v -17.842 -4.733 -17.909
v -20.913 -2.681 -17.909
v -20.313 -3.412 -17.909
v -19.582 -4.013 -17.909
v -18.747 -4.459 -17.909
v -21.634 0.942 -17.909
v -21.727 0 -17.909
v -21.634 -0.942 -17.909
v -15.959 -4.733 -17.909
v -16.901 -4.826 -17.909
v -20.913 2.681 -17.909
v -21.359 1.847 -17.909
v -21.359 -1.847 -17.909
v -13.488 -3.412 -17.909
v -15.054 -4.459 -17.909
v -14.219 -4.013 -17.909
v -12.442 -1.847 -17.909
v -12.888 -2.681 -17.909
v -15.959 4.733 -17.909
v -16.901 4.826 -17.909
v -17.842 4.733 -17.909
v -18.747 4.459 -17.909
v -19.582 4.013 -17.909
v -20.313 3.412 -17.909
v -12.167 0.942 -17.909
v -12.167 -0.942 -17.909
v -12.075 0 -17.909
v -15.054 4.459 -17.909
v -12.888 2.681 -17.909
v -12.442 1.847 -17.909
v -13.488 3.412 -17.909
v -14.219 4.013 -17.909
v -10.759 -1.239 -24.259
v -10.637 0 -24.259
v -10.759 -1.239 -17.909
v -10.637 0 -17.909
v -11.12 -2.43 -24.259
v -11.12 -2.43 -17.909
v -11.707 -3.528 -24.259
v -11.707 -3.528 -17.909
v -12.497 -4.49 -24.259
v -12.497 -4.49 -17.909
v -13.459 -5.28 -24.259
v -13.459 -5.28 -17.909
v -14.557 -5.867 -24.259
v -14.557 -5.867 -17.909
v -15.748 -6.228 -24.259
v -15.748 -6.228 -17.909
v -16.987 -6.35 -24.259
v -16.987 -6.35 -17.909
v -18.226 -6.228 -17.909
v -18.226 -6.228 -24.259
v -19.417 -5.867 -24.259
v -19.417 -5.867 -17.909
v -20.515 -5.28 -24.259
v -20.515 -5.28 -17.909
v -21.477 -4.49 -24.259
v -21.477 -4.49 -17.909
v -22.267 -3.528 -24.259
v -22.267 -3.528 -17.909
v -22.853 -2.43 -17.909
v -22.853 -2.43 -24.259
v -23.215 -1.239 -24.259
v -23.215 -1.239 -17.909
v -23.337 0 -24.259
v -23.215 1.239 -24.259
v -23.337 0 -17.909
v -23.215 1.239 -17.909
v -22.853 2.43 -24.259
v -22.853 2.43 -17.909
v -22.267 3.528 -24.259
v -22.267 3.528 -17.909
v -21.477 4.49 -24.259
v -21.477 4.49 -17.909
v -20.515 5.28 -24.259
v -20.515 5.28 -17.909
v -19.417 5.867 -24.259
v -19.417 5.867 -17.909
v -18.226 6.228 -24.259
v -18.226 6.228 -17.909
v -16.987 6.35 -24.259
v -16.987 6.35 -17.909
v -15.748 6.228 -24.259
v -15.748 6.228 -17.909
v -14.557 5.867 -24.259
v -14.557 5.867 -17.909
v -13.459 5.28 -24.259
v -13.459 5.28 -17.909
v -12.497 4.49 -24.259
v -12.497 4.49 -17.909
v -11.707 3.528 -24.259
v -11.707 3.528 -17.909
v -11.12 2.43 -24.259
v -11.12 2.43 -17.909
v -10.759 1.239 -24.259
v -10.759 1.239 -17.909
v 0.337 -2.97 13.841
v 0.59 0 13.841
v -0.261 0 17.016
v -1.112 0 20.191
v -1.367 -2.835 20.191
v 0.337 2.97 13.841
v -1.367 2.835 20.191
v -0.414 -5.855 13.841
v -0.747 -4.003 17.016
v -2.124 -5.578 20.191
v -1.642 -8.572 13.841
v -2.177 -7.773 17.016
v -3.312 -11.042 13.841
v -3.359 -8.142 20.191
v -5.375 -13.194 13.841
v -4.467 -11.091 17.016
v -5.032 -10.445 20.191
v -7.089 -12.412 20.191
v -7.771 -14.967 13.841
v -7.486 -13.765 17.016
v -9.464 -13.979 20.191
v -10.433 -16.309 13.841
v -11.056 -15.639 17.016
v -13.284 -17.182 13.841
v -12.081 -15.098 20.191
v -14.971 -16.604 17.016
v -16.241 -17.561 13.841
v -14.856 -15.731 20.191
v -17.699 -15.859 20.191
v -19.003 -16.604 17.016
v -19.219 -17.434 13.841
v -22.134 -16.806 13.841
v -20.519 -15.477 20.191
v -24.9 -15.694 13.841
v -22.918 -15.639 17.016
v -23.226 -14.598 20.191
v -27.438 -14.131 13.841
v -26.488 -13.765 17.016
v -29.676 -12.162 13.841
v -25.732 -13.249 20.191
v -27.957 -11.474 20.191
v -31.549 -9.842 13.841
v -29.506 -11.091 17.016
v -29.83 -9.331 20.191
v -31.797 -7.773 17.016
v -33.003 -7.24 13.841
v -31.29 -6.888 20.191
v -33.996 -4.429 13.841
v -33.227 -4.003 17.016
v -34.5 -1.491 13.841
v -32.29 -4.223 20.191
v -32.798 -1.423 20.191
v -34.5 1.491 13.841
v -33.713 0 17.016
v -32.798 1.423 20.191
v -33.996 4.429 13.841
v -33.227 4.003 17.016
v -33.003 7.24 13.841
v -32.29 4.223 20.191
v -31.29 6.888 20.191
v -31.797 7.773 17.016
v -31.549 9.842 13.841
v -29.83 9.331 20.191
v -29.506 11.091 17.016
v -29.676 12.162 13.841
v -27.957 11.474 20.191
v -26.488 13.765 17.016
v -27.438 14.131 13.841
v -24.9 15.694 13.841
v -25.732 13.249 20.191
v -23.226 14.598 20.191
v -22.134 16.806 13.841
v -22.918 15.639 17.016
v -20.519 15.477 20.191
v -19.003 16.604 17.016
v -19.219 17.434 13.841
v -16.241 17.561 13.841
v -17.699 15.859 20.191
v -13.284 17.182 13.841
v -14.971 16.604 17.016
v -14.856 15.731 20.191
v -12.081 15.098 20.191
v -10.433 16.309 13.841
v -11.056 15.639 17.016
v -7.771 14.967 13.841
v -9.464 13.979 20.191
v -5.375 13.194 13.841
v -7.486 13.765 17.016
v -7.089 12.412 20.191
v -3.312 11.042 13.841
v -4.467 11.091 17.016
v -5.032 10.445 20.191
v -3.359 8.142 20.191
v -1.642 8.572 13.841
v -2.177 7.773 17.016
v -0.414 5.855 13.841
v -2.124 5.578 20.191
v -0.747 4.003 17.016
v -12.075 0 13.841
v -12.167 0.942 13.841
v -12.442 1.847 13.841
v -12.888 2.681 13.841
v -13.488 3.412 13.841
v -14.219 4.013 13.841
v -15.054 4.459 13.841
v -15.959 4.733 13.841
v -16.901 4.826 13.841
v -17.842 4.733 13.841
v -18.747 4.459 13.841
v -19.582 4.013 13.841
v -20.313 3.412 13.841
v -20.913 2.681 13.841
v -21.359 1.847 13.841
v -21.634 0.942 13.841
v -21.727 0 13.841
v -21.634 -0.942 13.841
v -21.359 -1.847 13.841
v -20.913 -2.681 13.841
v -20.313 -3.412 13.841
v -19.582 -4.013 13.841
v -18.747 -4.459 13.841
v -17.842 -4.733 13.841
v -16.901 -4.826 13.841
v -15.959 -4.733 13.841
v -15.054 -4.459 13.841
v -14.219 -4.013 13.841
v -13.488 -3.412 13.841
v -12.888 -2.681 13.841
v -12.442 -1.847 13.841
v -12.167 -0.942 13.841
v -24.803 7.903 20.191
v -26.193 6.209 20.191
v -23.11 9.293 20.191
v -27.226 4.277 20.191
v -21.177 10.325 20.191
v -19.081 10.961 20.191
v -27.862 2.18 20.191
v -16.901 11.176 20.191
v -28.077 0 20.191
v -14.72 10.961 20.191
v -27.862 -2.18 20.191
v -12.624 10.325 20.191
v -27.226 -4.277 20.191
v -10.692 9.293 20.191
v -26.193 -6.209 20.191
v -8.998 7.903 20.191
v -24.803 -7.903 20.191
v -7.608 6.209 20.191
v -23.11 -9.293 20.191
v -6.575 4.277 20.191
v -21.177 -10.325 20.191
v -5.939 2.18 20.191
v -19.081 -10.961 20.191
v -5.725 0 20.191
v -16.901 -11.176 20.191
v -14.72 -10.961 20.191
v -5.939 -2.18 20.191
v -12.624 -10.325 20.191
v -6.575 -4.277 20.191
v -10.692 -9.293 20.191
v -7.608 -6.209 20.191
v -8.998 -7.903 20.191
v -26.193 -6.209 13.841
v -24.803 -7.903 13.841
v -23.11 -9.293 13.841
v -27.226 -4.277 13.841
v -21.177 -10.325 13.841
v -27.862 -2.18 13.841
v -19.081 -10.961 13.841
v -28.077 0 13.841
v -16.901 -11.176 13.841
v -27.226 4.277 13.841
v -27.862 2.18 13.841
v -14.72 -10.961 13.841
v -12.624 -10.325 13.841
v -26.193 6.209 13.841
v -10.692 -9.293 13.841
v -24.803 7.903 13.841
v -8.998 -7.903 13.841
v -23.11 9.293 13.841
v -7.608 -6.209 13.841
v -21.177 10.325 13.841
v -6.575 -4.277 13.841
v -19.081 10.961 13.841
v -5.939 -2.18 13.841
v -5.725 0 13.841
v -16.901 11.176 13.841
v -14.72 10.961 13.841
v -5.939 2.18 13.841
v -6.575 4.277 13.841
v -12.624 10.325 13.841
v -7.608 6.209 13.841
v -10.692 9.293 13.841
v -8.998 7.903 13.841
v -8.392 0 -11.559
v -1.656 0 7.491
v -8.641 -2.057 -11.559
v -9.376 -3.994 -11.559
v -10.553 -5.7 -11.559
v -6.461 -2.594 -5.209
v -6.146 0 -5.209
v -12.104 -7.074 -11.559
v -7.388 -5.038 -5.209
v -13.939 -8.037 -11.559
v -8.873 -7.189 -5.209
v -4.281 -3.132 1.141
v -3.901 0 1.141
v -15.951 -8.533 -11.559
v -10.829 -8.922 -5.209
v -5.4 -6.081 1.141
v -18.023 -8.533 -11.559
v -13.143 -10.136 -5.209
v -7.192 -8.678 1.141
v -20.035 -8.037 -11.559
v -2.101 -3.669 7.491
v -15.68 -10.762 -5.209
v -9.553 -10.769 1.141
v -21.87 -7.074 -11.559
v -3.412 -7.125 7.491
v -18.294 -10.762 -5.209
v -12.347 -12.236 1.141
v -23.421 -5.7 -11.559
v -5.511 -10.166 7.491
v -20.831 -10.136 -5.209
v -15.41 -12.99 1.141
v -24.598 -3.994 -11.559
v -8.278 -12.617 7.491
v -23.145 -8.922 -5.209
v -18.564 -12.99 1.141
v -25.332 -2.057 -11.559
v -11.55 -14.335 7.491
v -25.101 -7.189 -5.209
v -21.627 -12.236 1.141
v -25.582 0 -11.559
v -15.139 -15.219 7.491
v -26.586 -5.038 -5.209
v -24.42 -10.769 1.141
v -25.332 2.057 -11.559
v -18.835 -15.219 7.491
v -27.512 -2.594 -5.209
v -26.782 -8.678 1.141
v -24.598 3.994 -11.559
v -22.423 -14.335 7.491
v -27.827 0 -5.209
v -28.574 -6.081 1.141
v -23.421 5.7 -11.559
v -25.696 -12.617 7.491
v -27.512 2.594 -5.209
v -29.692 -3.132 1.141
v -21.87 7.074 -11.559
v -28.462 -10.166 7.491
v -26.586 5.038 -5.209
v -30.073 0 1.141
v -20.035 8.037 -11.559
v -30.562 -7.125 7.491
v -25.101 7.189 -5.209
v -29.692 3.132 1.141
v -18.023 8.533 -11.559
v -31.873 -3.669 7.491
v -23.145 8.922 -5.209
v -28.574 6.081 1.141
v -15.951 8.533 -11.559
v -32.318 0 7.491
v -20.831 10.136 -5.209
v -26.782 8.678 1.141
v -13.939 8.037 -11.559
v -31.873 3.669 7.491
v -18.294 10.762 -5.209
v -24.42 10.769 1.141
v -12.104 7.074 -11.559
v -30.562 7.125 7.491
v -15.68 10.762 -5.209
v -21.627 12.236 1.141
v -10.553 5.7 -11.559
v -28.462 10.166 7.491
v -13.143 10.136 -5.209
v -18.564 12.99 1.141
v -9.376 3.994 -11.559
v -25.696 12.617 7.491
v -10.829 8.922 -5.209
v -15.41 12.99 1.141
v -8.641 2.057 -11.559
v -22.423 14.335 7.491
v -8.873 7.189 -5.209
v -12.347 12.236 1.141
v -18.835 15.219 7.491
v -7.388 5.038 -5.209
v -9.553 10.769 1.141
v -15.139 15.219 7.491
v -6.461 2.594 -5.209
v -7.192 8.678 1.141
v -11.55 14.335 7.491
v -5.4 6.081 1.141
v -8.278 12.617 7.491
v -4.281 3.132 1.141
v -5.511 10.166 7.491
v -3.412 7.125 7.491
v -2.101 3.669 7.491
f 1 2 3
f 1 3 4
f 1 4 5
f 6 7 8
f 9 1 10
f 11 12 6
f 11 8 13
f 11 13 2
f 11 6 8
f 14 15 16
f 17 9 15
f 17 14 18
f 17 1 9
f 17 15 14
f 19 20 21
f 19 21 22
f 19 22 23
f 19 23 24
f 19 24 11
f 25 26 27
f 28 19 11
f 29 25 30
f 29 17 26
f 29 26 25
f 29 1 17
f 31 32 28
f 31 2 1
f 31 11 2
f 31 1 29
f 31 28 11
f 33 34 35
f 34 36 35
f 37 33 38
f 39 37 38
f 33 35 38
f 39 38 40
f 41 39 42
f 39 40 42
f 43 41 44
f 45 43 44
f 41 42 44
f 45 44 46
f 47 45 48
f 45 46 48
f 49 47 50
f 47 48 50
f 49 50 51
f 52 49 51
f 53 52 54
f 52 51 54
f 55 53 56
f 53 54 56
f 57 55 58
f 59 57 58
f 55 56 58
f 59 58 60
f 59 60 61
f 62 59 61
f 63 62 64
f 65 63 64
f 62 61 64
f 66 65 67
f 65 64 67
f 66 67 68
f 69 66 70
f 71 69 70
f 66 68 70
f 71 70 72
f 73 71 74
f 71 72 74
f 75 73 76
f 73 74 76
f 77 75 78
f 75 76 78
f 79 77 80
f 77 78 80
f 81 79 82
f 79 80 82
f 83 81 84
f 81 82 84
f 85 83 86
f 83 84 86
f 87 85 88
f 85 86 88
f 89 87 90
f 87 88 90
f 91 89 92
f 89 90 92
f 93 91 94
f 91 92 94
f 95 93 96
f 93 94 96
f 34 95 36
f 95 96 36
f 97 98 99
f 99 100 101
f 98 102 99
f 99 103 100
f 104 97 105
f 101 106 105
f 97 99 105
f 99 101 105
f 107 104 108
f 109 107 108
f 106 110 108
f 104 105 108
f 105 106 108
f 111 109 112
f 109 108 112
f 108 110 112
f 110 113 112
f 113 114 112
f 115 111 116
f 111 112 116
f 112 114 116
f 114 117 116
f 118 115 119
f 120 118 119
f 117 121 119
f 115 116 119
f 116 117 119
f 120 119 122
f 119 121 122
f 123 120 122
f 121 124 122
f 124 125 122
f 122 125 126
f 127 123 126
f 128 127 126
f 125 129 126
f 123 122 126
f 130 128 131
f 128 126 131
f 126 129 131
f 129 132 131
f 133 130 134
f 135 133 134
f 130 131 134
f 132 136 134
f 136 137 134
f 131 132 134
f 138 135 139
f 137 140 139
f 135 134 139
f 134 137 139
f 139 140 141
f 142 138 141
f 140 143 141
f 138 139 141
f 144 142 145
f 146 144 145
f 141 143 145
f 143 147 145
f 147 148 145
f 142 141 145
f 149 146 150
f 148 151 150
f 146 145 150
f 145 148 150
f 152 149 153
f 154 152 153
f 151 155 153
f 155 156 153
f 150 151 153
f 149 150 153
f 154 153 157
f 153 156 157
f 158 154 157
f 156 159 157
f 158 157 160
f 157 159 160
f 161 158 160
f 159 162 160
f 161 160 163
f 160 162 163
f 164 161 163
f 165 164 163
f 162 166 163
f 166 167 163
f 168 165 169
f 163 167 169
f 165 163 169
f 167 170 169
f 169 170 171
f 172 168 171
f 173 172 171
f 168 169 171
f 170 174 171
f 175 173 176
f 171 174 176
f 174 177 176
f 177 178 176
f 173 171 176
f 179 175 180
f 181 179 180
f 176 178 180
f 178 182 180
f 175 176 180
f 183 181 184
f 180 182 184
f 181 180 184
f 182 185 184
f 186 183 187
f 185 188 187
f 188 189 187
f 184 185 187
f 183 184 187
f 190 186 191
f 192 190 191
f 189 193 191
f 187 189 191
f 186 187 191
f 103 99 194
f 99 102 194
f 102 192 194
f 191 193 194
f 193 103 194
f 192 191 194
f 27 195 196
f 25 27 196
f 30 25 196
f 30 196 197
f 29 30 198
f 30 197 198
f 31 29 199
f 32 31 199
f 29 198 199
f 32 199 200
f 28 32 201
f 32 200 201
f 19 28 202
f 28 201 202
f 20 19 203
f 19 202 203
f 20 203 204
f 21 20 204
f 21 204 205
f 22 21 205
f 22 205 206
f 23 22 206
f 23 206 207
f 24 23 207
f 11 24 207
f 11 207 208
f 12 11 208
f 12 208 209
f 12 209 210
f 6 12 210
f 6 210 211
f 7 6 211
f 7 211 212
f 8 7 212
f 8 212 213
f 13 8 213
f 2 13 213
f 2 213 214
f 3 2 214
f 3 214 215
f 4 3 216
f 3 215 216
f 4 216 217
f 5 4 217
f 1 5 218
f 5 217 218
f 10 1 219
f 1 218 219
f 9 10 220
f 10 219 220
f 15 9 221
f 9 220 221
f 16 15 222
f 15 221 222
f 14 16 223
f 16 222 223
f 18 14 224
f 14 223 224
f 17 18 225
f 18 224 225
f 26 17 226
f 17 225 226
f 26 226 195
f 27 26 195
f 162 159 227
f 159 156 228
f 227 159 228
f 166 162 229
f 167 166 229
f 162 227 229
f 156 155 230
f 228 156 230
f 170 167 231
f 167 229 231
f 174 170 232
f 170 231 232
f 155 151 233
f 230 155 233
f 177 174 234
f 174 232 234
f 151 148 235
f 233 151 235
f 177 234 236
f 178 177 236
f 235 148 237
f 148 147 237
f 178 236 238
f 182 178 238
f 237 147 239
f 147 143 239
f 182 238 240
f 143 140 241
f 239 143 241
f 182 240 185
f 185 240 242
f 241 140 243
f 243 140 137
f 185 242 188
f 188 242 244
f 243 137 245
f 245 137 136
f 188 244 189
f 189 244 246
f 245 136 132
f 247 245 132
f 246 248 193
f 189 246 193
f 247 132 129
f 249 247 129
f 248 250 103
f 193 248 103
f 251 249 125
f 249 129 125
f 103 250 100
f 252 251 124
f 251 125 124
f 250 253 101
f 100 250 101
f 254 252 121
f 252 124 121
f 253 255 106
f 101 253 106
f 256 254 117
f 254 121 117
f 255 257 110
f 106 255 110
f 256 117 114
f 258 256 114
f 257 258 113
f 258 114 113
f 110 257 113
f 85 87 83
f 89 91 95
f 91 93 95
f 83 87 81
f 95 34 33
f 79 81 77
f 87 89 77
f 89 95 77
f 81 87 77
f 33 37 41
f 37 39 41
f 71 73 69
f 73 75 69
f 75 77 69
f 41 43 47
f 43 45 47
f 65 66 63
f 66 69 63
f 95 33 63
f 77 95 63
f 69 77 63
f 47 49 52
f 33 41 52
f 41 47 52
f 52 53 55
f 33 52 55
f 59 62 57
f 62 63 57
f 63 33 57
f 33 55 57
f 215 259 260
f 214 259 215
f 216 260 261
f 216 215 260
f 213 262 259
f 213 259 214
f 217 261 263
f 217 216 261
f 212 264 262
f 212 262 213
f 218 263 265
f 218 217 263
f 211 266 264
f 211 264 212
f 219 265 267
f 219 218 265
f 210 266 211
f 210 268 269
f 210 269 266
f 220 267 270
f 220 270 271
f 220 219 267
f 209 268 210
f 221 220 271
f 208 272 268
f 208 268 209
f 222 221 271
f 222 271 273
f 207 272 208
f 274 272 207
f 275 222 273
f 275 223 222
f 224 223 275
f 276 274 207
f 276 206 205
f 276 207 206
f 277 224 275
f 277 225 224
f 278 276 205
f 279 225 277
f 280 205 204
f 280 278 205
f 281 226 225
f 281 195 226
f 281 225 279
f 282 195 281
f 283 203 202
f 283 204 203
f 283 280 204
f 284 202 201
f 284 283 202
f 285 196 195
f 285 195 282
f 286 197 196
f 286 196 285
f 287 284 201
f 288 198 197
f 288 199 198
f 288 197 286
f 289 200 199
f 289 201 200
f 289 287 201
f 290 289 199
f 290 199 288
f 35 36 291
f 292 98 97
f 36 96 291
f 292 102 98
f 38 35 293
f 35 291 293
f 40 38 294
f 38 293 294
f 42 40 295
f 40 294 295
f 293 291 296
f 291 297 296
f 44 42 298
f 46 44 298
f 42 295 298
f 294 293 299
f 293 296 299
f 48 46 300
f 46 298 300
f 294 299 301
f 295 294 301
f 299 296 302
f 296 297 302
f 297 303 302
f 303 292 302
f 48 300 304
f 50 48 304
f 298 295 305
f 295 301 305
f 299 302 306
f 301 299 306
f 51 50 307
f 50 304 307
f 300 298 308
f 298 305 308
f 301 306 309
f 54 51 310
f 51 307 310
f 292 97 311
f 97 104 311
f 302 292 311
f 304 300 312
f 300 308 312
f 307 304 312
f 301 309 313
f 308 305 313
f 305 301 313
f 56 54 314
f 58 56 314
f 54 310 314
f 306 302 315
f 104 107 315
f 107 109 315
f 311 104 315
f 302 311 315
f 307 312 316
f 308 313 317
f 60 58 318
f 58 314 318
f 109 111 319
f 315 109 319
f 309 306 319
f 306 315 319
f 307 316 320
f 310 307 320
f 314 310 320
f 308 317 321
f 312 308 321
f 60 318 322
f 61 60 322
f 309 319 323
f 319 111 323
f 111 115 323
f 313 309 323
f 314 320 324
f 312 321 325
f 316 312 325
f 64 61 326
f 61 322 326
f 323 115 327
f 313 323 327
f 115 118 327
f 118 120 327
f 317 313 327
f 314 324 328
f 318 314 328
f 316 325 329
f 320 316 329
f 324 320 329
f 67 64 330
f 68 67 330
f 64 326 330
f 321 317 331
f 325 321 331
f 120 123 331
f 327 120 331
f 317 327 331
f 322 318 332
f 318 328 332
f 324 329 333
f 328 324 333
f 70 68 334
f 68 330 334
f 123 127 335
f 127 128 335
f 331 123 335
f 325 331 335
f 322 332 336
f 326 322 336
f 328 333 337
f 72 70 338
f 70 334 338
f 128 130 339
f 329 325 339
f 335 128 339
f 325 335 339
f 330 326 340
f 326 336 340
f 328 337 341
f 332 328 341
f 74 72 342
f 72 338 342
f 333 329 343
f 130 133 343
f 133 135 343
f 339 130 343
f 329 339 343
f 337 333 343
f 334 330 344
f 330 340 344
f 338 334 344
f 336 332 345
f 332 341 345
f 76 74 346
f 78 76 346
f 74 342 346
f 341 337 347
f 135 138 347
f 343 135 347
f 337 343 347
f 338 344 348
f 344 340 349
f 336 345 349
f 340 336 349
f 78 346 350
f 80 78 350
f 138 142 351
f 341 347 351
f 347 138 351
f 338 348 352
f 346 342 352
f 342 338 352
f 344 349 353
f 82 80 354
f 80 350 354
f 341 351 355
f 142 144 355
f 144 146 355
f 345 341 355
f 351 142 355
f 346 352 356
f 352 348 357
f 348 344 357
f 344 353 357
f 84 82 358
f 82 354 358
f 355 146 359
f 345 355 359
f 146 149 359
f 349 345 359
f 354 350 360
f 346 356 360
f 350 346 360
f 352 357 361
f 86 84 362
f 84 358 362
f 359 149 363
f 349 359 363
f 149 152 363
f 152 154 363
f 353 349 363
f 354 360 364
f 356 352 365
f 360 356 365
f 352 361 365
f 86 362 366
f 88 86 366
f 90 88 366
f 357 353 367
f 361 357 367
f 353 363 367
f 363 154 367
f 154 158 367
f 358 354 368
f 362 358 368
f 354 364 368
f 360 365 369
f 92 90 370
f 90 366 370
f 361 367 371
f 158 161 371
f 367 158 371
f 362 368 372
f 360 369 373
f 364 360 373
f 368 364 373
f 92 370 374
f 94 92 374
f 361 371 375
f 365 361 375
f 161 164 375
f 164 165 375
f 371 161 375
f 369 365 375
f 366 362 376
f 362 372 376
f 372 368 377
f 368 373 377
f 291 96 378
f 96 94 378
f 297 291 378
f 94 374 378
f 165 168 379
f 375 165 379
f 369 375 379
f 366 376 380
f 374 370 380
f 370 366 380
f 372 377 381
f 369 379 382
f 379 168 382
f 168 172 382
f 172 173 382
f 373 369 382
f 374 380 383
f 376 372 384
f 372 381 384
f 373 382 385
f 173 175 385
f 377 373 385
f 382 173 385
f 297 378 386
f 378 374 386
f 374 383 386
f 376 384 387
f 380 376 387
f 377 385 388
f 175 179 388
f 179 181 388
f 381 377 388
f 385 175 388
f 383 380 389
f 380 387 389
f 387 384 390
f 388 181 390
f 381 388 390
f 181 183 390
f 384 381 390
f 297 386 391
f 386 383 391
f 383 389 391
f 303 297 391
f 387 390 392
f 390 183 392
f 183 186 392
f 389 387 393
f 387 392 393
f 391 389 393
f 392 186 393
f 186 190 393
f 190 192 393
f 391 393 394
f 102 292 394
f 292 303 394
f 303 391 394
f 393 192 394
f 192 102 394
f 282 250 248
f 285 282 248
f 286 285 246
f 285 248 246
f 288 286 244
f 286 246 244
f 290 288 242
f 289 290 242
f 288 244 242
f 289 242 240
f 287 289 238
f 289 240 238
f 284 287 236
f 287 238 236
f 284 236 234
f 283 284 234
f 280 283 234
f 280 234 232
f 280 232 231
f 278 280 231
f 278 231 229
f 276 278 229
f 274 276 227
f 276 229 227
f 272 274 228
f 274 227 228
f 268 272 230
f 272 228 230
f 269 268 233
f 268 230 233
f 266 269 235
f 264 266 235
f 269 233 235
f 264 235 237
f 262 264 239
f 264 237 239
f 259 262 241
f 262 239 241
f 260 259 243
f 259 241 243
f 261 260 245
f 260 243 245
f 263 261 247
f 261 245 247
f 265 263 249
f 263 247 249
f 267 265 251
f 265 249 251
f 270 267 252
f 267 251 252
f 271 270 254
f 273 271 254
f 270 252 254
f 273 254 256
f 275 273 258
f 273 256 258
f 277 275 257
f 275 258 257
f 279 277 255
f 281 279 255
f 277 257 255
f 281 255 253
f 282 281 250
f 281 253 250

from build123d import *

# Parameters (mm, degrees)
F2_R     = 4.826
F3_DEPTH = 38.1
F2_R_2   = 11.176
F4_DEPTH = 6.35


with BuildPart() as f1:
    # F0 (on Front) → F1 (revolve)
    with BuildSketch(Plane.XZ):
        Polygon((-16.98684, -24.258915), (-10.63684, -24.258915), (-10.63684, -17.908915), (0.589637, 13.841085), (-1.11184, 20.191085), (-16.98684, 20.191085), align=None)
    revolve(axis=Axis((-16.98684, 0, -2.033915), (0, 0, -1)))

    # F2 (on face) → F3 (cut)
    with BuildSketch(Plane.XY.offset(20.191085)):
        with Locations((-16.900598, 0)):
            Circle(F2_R)
    extrude(amount=-F3_DEPTH, mode=Mode.SUBTRACT)

    # F2 (on face) → F4 (cut)
    with BuildSketch(Plane.XY.offset(20.191085)):
        with Locations((-16.900598, 0)):
            Circle(F2_R_2)
        with Locations((-16.900598, 0)):
            Circle(F2_R, mode=Mode.SUBTRACT)
    extrude(amount=-F4_DEPTH, mode=Mode.SUBTRACT)


solid = f1.part
